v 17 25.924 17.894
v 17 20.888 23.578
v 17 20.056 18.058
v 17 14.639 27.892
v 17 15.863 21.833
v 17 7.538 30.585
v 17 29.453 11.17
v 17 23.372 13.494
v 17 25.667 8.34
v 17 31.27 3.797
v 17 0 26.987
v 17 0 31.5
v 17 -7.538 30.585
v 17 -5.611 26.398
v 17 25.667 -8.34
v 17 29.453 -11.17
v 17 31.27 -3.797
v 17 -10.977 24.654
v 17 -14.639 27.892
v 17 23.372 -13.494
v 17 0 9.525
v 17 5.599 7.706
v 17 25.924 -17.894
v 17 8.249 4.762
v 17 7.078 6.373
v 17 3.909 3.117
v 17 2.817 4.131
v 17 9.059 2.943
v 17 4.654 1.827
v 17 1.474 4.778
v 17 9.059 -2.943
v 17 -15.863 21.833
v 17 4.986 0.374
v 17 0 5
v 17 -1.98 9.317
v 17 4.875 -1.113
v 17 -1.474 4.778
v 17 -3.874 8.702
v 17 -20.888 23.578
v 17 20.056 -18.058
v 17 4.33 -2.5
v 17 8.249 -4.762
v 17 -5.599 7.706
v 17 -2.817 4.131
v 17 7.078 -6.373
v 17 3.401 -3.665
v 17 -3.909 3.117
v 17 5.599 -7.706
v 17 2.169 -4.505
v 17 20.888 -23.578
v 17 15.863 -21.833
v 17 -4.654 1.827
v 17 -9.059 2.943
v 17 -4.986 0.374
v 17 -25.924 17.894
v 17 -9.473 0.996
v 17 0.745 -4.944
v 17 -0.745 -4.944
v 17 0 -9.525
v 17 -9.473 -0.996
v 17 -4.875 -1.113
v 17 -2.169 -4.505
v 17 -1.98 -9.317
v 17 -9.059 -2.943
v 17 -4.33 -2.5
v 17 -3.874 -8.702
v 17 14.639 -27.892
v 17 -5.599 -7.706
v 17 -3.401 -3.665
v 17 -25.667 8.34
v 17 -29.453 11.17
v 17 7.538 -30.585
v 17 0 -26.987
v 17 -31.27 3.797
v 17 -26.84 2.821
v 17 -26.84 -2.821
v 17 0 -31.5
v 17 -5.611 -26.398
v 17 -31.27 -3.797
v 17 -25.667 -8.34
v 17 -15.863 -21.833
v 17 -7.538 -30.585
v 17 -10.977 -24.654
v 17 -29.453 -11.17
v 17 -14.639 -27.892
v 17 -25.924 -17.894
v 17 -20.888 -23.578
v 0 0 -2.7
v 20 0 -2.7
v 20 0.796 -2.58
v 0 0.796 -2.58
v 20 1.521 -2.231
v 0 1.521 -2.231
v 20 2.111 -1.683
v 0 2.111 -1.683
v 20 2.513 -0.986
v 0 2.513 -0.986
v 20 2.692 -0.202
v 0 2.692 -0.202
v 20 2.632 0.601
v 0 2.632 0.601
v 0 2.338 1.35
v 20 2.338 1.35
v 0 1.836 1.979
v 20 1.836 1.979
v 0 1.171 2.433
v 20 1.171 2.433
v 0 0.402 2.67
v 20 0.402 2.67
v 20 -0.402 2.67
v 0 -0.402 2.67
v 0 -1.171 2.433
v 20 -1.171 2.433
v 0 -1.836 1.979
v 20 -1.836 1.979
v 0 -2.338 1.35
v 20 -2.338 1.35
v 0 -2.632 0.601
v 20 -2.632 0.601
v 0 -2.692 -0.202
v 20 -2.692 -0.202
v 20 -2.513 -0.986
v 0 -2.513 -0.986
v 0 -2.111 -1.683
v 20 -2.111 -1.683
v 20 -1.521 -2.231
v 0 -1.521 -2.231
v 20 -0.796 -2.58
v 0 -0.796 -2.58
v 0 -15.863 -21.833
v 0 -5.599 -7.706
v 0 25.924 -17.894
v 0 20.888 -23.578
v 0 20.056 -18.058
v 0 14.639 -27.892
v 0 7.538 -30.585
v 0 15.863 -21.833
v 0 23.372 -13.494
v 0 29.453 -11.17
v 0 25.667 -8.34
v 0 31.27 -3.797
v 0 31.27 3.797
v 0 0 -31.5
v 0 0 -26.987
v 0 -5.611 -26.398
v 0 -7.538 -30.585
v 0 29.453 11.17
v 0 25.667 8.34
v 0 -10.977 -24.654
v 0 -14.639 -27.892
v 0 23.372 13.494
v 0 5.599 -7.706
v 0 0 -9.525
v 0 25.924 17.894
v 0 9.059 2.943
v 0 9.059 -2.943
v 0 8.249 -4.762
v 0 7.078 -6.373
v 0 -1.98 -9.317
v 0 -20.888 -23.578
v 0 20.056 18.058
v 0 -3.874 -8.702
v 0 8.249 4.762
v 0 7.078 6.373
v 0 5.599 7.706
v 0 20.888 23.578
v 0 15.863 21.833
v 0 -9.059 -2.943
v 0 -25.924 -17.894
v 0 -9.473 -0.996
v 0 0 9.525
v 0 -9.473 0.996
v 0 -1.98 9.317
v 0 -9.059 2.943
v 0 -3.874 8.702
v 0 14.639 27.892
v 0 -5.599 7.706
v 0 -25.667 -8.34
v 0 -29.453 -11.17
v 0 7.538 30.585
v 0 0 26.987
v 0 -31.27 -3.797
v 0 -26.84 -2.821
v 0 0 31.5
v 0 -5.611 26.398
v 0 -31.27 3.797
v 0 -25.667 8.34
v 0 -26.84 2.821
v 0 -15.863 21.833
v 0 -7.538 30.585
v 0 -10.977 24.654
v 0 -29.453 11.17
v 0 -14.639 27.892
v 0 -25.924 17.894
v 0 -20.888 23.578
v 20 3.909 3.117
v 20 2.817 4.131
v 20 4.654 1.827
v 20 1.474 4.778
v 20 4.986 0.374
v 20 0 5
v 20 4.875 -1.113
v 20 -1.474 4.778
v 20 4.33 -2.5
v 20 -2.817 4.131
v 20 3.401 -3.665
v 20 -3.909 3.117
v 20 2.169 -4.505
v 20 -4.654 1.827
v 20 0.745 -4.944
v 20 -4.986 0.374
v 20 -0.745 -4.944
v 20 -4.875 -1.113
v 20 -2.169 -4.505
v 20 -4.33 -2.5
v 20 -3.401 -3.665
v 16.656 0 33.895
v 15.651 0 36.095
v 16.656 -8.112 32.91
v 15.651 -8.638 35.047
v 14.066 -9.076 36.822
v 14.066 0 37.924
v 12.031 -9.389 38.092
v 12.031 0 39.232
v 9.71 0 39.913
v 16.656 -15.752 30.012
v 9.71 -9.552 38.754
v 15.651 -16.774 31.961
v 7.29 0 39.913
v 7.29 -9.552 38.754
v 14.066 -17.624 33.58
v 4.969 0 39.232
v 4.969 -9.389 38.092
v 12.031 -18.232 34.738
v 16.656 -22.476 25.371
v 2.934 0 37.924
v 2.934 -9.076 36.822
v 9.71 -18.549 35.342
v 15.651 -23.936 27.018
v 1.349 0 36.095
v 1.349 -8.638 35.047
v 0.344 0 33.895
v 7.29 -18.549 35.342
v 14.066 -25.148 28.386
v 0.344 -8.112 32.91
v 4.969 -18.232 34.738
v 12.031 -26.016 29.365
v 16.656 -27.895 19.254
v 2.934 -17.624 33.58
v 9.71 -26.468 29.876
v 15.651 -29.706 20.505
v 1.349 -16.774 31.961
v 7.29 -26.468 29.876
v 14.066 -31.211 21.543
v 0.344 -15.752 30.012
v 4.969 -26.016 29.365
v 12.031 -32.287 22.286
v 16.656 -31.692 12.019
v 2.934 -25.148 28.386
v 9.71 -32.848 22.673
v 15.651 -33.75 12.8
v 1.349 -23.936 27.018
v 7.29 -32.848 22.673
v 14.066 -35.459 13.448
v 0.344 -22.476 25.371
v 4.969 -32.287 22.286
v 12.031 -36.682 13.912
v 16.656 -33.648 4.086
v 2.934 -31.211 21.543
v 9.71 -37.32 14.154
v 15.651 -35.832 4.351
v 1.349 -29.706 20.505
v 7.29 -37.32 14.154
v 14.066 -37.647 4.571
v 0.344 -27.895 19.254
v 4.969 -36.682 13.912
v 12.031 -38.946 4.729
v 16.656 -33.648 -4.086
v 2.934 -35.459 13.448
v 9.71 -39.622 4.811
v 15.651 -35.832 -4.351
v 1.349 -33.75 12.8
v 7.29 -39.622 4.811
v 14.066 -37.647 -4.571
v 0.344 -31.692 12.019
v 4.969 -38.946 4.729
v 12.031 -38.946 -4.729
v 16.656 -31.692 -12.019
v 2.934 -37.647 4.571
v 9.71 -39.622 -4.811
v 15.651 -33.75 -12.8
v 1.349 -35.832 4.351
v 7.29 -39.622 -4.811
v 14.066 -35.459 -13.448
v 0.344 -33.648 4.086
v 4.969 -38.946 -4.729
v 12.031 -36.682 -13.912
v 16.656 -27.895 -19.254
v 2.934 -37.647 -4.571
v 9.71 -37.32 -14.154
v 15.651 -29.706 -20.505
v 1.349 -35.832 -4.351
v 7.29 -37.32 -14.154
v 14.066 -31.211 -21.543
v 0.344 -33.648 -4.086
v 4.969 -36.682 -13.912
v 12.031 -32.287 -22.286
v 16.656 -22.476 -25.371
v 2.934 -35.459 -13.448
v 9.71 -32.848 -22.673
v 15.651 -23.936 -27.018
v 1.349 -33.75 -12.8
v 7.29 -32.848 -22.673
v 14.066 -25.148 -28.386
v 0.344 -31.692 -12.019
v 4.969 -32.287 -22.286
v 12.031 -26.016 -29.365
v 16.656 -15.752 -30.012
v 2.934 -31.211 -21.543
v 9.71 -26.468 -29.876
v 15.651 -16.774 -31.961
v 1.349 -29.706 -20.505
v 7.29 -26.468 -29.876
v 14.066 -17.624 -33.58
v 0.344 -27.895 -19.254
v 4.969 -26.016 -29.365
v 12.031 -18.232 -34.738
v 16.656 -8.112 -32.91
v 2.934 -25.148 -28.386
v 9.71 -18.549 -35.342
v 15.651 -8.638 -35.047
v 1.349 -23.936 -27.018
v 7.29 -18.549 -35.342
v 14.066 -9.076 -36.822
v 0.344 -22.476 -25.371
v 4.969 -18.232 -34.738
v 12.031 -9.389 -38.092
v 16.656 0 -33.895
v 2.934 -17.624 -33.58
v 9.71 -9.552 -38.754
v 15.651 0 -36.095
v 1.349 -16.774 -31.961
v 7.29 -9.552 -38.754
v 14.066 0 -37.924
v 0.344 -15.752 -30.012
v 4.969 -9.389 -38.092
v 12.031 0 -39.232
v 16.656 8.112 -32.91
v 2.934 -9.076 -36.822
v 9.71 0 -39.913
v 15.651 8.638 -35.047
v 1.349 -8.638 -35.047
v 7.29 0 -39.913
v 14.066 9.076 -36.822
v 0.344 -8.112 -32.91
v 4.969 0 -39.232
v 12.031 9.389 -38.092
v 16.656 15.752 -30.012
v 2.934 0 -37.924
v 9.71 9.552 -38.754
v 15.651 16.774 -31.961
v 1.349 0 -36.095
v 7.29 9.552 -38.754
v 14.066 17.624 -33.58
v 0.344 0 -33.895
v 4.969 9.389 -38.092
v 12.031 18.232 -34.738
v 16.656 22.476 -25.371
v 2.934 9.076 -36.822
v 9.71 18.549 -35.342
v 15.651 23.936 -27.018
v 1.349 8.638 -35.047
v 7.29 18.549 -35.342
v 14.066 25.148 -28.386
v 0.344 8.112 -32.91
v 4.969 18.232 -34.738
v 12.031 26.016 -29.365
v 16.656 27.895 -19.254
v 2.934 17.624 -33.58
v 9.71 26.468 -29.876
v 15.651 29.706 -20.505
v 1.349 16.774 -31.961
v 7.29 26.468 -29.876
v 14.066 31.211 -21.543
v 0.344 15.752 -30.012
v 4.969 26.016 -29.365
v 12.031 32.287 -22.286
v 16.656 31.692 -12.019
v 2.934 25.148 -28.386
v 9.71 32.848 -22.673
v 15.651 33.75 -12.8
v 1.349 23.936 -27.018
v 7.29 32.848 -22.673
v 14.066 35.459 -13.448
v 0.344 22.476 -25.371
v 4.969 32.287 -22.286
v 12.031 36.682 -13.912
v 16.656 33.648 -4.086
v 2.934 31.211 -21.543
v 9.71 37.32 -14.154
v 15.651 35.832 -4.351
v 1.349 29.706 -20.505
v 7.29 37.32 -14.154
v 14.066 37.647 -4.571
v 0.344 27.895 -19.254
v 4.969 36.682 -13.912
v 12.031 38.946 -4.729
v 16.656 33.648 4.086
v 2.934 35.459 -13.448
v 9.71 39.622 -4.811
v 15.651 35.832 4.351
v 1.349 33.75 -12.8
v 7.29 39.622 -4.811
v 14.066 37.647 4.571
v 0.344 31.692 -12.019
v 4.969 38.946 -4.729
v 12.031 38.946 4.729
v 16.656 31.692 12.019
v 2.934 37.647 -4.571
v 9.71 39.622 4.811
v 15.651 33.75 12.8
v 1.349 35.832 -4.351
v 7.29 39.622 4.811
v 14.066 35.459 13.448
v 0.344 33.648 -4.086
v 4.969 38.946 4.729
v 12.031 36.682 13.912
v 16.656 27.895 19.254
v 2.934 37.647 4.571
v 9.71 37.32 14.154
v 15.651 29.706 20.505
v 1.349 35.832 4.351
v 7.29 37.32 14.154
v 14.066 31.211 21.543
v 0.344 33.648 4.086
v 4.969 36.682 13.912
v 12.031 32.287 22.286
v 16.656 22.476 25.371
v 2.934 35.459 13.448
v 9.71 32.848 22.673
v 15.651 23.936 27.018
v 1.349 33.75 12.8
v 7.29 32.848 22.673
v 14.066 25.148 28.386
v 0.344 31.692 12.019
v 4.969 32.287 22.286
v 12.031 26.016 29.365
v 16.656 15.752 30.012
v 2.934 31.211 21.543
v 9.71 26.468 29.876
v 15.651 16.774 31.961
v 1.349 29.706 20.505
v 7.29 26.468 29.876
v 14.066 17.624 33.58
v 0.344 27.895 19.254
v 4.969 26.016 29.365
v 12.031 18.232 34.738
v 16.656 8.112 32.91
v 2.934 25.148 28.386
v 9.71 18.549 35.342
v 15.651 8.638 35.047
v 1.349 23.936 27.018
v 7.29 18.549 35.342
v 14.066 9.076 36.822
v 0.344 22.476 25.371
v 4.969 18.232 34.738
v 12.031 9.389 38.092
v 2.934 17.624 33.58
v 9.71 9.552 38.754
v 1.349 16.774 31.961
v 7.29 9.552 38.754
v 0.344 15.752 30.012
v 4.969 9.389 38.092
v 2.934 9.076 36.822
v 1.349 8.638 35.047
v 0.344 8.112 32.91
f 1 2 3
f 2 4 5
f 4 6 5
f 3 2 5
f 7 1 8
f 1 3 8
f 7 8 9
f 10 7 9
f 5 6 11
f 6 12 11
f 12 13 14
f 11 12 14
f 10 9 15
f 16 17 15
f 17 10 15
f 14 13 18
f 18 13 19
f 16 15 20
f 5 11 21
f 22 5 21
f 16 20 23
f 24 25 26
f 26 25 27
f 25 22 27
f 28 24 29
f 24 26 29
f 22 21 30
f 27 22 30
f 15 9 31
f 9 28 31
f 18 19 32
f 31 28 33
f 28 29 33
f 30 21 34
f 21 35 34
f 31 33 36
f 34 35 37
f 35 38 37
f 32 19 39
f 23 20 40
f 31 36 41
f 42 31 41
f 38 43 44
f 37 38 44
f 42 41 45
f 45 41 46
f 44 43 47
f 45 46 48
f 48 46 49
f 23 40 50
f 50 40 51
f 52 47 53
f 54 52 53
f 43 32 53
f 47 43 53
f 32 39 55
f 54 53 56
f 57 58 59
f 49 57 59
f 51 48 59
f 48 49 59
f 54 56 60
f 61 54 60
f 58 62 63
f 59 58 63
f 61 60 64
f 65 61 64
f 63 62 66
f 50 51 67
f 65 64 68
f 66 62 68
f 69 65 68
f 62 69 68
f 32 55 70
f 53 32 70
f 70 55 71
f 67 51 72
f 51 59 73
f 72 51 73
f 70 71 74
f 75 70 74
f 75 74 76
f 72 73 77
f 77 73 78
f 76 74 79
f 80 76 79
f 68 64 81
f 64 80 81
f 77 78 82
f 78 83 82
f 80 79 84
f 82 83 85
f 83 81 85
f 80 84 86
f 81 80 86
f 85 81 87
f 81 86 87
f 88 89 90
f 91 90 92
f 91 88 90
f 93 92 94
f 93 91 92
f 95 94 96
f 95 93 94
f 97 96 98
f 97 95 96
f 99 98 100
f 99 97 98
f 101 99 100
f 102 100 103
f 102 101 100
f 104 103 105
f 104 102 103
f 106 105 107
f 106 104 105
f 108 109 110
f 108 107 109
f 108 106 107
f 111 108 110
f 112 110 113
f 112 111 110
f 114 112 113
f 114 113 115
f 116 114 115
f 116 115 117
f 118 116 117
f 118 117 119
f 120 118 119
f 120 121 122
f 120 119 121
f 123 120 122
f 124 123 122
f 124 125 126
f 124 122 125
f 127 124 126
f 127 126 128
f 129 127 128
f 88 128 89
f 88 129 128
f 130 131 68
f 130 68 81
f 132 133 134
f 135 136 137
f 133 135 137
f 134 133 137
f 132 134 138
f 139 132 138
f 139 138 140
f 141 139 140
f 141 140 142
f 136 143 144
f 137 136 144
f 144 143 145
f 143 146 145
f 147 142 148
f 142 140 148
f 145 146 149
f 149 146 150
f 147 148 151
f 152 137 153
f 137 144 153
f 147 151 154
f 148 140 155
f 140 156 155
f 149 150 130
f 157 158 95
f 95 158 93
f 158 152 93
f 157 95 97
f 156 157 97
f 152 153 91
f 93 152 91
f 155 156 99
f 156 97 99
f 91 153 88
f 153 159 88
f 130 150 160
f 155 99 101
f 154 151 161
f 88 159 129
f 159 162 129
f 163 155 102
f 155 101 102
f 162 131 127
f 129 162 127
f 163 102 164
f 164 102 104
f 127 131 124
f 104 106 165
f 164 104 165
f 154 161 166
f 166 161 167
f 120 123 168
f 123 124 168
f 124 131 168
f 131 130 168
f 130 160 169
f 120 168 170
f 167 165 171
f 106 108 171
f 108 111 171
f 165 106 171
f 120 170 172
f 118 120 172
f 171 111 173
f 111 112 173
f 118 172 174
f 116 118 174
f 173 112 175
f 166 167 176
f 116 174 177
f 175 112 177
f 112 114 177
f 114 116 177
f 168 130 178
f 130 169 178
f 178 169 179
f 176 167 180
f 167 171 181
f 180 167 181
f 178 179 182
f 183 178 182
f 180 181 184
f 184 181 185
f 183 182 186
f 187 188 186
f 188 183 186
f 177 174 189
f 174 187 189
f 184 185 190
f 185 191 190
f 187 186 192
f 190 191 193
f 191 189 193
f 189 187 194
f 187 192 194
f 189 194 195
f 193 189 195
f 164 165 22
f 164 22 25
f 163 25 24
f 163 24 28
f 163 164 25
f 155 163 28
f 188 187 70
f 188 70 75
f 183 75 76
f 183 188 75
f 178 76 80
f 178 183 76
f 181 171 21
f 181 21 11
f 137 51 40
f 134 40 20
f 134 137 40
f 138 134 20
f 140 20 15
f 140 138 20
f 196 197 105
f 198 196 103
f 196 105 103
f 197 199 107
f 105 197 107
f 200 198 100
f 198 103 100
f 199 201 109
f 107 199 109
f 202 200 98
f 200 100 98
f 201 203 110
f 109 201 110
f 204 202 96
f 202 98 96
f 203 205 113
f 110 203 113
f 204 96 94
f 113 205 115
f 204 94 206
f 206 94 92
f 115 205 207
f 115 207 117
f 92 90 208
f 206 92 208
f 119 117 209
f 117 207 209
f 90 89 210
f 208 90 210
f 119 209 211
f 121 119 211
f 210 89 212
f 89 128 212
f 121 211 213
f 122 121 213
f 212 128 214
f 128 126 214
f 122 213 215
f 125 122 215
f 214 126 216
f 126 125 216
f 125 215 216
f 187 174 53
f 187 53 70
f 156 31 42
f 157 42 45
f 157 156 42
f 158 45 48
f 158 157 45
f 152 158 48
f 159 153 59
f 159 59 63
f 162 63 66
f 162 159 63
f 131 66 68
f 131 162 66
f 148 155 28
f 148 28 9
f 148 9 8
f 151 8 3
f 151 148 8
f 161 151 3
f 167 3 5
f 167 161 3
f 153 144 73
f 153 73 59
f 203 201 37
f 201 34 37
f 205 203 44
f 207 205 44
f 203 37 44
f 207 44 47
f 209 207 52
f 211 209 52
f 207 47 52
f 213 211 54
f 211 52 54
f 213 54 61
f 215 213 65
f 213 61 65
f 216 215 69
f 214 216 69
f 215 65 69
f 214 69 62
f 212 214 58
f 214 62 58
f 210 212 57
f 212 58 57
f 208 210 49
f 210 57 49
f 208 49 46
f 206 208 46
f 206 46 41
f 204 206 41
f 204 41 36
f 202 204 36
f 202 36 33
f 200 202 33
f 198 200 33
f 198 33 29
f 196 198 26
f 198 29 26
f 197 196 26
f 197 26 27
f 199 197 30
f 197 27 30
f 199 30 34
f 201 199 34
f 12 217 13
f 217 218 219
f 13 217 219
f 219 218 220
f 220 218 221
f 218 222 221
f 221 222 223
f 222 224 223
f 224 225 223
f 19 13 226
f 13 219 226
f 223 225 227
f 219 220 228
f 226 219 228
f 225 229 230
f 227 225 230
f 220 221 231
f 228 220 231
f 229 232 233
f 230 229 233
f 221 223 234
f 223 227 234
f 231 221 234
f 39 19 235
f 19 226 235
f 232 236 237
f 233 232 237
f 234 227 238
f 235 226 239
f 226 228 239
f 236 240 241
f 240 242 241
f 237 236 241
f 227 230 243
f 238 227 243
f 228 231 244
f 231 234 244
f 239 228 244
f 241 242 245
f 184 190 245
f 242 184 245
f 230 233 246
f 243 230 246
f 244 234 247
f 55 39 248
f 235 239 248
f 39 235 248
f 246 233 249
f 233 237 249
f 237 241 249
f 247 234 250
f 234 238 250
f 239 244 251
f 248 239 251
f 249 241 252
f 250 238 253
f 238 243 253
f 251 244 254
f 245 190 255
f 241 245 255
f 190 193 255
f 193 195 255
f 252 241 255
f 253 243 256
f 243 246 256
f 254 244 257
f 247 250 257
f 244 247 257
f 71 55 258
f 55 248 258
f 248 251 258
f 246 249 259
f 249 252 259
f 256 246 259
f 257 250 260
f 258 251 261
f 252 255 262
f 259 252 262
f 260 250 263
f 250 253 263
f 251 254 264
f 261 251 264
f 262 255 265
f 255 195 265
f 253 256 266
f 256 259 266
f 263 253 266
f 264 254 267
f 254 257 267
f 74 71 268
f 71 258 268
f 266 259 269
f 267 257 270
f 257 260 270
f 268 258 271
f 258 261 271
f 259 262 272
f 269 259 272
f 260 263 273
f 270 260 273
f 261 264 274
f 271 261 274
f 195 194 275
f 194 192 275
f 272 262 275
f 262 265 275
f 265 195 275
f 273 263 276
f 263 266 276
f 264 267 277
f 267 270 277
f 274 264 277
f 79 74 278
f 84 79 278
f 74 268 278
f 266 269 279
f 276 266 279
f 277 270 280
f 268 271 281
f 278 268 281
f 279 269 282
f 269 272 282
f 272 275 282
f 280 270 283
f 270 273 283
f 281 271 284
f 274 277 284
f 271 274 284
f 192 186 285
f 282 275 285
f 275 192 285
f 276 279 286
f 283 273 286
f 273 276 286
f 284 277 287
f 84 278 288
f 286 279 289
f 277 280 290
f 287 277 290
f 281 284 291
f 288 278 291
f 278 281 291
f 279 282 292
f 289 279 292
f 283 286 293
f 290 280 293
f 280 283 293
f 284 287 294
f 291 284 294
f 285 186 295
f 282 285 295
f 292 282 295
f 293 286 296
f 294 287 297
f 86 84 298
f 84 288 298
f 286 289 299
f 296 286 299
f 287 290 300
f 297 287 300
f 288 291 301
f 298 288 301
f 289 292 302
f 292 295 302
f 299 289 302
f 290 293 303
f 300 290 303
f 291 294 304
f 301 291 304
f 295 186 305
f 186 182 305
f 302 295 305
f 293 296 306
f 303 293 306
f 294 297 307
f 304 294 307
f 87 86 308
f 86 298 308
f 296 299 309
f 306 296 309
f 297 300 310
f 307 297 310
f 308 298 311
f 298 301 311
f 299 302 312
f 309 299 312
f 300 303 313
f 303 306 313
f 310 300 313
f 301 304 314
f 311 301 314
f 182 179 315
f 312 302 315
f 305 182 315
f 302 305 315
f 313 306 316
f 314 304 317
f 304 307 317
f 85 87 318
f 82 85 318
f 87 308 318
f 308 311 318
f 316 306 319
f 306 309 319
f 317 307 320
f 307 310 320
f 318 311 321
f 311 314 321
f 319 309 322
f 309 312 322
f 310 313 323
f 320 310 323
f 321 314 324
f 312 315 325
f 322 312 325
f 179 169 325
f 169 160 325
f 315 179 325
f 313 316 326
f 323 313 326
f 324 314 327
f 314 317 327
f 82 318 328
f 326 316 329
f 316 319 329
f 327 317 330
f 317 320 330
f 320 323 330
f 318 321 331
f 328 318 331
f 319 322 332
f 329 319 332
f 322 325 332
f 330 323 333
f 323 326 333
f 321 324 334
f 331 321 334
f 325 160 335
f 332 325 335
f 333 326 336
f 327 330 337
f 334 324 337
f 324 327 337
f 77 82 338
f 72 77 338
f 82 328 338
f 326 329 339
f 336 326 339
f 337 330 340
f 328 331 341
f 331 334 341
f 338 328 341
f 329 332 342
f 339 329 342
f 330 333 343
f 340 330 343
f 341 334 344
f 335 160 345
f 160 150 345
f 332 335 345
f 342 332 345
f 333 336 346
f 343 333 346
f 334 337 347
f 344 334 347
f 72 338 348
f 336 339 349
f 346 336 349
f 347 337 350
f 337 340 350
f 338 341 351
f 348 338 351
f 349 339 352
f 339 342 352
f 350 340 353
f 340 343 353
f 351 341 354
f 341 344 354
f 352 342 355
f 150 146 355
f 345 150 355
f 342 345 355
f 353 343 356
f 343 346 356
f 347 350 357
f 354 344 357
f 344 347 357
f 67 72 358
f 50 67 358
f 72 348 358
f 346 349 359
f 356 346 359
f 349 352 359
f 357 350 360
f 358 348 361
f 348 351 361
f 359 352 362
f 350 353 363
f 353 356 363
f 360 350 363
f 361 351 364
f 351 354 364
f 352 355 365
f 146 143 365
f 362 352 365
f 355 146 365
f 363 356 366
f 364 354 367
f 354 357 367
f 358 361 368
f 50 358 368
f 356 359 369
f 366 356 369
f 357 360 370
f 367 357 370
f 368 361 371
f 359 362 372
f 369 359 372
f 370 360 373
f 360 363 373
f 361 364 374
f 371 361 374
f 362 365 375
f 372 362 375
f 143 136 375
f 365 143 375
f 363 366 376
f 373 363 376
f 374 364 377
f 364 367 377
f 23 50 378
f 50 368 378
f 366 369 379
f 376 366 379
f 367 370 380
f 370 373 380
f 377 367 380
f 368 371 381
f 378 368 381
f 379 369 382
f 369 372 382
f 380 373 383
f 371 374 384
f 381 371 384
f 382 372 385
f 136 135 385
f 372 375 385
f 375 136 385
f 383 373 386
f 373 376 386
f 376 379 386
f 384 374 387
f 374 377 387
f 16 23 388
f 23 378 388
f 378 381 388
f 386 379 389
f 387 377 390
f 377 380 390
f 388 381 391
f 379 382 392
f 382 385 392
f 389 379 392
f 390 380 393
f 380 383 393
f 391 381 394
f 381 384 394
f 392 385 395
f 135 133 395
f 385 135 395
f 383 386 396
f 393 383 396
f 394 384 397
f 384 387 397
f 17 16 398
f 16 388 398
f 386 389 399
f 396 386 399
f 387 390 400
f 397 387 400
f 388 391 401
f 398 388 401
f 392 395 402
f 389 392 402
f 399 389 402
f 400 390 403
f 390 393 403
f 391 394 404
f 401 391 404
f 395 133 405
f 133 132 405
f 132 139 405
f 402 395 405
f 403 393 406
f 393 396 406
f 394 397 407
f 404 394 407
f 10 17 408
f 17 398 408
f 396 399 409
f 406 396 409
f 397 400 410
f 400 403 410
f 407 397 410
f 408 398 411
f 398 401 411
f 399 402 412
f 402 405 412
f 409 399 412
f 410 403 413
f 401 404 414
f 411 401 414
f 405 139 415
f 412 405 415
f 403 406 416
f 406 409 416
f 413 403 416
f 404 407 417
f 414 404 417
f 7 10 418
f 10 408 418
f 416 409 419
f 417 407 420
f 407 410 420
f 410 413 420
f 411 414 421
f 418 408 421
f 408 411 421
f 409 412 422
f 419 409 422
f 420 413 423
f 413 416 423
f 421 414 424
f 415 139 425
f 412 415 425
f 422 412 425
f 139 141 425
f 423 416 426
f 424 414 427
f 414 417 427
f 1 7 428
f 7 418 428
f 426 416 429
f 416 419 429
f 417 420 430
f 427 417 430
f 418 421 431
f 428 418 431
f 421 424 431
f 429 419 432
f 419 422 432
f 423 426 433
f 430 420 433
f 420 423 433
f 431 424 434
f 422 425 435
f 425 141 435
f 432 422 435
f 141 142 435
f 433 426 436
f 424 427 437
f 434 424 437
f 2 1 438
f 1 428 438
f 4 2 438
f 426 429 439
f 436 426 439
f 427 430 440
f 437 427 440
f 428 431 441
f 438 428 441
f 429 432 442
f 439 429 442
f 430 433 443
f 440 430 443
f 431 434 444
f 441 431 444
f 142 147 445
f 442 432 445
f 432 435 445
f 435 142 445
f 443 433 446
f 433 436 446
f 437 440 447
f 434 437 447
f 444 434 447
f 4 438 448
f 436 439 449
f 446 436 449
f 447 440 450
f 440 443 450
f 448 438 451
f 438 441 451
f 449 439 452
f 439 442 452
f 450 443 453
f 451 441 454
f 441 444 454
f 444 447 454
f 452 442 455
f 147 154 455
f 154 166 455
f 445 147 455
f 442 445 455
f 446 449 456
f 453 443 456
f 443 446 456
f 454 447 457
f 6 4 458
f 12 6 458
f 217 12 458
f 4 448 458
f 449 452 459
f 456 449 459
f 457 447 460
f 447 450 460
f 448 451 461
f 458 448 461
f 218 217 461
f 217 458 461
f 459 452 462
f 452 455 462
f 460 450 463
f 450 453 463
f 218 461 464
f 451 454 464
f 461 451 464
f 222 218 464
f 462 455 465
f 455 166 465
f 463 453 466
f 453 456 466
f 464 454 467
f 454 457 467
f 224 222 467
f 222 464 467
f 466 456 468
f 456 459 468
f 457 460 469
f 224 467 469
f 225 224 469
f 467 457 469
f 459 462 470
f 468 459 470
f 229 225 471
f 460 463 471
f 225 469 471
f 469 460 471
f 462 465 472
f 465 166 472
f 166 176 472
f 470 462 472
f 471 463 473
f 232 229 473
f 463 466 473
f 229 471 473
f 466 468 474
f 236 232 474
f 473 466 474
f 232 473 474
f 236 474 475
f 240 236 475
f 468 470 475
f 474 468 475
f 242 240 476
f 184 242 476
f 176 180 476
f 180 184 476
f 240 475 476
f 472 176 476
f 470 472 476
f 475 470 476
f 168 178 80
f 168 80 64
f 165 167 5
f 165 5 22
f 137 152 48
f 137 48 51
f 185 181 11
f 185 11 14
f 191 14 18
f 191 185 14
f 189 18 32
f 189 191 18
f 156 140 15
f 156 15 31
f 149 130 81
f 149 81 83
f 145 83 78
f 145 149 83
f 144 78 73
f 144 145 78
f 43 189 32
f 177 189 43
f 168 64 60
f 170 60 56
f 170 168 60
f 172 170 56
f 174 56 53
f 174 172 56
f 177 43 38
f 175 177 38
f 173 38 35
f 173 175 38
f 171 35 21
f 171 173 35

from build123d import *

# Parameters (mm, degrees)
SKETCH2_R          = 2.7
CUT_EXTRUDE1_DEPTH = 61.000000133
CUT_EXTRUDE2_DEPTH = 61.000000133


with BuildPart() as part:
    # Sketch1 → Revolve1 (revolve)
    with BuildSketch(Plane.XY, mode=Mode.PRIVATE) as revolve1_sk:
        with BuildLine():
            Line((0, 31.5), (0, 0))
            Line((0, 0), (20, 0))
            Line((20, 0), (20, 5))
            Line((20, 5), (17, 5))
            Line((17, 5), (17, 31.5))
            ThreePointArc((17, 31.5), (8.5, 40), (0, 31.5))
        make_face()
    revolve(revolve1_sk.sketch.rotate(Axis((0, 0, 0), (1, 0, 0)), 90), axis=Axis((0, 0, 0), (1, 0, 0)))

    # Sketch2 → Cut-Extrude1 (cut, through all)
    with BuildSketch(Plane(origin=(0, 0, 0), x_dir=(0, 0, -1), z_dir=(1, 0, 0))):
        Circle(SKETCH2_R)
    extrude(amount=CUT_EXTRUDE1_DEPTH, mode=Mode.SUBTRACT)

    # Sketch3 → Cut-Extrude2 (cut, through all)
    with BuildSketch(Plane(origin=(0, 0, 0), x_dir=(0, 0, -1), z_dir=(1, 0, 0))):
        with BuildLine():
            Line((-21.833346136, 15.862854496), (-7.705886871, 5.598654528))
            ThreePointArc((-7.705886871, 5.598654528), (-5.598654528, 7.705886871), (-2.943386871, 9.058813318))
            Line((-2.943386871, 9.058813318), (-8.339596136, 25.666637734))
            ThreePointArc((-8.339596136, 25.666637734), (-15.862854496, 21.833346136), (-21.833346136, 15.862854496))
        make_face()
        with BuildLine():
            Line((8.339596136, 25.666637734), (2.943386871, 9.058813318))
            ThreePointArc((2.943386871, 9.058813318), (5.598654528, 7.705886871), (7.705886871, 5.598654528))
            Line((7.705886871, 5.598654528), (21.833346136, 15.862854496))
            ThreePointArc((21.833346136, 15.862854496), (15.862854496, 21.833346136), (8.339596136, 25.666637734))
        make_face()
        with BuildLine():
            Line((26.9875, 0), (9.525, 0))
            ThreePointArc((9.525, 0), (9.058813318, -2.943386871), (7.705886871, -5.598654528))
            Line((7.705886871, -5.598654528), (21.833346136, -15.862854496))
            ThreePointArc((21.833346136, -15.862854496), (25.666637734, -8.339596136), (26.9875, 0))
        make_face()
        with BuildLine():
            Line((8.339596136, -25.666637734), (2.943386871, -9.058813318))
            ThreePointArc((2.943386871, -9.058813318), (0, -9.525), (-2.943386871, -9.058813318))
            Line((-2.943386871, -9.058813318), (-8.339596136, -25.666637734))
            ThreePointArc((-8.339596136, -25.666637734), (0, -26.9875), (8.339596136, -25.666637734))
        make_face()
        with BuildLine():
            Line((-21.833346136, -15.862854496), (-7.705886871, -5.598654528))
            ThreePointArc((-7.705886871, -5.598654528), (-9.058813318, -2.943386871), (-9.525, 0))
            Line((-9.525, 0), (-26.9875, 0))
            ThreePointArc((-26.9875, 0), (-25.666637734, -8.339596136), (-21.833346136, -15.862854496))
        make_face()
    extrude(amount=CUT_EXTRUDE2_DEPTH, mode=Mode.SUBTRACT)


solid = part.part
